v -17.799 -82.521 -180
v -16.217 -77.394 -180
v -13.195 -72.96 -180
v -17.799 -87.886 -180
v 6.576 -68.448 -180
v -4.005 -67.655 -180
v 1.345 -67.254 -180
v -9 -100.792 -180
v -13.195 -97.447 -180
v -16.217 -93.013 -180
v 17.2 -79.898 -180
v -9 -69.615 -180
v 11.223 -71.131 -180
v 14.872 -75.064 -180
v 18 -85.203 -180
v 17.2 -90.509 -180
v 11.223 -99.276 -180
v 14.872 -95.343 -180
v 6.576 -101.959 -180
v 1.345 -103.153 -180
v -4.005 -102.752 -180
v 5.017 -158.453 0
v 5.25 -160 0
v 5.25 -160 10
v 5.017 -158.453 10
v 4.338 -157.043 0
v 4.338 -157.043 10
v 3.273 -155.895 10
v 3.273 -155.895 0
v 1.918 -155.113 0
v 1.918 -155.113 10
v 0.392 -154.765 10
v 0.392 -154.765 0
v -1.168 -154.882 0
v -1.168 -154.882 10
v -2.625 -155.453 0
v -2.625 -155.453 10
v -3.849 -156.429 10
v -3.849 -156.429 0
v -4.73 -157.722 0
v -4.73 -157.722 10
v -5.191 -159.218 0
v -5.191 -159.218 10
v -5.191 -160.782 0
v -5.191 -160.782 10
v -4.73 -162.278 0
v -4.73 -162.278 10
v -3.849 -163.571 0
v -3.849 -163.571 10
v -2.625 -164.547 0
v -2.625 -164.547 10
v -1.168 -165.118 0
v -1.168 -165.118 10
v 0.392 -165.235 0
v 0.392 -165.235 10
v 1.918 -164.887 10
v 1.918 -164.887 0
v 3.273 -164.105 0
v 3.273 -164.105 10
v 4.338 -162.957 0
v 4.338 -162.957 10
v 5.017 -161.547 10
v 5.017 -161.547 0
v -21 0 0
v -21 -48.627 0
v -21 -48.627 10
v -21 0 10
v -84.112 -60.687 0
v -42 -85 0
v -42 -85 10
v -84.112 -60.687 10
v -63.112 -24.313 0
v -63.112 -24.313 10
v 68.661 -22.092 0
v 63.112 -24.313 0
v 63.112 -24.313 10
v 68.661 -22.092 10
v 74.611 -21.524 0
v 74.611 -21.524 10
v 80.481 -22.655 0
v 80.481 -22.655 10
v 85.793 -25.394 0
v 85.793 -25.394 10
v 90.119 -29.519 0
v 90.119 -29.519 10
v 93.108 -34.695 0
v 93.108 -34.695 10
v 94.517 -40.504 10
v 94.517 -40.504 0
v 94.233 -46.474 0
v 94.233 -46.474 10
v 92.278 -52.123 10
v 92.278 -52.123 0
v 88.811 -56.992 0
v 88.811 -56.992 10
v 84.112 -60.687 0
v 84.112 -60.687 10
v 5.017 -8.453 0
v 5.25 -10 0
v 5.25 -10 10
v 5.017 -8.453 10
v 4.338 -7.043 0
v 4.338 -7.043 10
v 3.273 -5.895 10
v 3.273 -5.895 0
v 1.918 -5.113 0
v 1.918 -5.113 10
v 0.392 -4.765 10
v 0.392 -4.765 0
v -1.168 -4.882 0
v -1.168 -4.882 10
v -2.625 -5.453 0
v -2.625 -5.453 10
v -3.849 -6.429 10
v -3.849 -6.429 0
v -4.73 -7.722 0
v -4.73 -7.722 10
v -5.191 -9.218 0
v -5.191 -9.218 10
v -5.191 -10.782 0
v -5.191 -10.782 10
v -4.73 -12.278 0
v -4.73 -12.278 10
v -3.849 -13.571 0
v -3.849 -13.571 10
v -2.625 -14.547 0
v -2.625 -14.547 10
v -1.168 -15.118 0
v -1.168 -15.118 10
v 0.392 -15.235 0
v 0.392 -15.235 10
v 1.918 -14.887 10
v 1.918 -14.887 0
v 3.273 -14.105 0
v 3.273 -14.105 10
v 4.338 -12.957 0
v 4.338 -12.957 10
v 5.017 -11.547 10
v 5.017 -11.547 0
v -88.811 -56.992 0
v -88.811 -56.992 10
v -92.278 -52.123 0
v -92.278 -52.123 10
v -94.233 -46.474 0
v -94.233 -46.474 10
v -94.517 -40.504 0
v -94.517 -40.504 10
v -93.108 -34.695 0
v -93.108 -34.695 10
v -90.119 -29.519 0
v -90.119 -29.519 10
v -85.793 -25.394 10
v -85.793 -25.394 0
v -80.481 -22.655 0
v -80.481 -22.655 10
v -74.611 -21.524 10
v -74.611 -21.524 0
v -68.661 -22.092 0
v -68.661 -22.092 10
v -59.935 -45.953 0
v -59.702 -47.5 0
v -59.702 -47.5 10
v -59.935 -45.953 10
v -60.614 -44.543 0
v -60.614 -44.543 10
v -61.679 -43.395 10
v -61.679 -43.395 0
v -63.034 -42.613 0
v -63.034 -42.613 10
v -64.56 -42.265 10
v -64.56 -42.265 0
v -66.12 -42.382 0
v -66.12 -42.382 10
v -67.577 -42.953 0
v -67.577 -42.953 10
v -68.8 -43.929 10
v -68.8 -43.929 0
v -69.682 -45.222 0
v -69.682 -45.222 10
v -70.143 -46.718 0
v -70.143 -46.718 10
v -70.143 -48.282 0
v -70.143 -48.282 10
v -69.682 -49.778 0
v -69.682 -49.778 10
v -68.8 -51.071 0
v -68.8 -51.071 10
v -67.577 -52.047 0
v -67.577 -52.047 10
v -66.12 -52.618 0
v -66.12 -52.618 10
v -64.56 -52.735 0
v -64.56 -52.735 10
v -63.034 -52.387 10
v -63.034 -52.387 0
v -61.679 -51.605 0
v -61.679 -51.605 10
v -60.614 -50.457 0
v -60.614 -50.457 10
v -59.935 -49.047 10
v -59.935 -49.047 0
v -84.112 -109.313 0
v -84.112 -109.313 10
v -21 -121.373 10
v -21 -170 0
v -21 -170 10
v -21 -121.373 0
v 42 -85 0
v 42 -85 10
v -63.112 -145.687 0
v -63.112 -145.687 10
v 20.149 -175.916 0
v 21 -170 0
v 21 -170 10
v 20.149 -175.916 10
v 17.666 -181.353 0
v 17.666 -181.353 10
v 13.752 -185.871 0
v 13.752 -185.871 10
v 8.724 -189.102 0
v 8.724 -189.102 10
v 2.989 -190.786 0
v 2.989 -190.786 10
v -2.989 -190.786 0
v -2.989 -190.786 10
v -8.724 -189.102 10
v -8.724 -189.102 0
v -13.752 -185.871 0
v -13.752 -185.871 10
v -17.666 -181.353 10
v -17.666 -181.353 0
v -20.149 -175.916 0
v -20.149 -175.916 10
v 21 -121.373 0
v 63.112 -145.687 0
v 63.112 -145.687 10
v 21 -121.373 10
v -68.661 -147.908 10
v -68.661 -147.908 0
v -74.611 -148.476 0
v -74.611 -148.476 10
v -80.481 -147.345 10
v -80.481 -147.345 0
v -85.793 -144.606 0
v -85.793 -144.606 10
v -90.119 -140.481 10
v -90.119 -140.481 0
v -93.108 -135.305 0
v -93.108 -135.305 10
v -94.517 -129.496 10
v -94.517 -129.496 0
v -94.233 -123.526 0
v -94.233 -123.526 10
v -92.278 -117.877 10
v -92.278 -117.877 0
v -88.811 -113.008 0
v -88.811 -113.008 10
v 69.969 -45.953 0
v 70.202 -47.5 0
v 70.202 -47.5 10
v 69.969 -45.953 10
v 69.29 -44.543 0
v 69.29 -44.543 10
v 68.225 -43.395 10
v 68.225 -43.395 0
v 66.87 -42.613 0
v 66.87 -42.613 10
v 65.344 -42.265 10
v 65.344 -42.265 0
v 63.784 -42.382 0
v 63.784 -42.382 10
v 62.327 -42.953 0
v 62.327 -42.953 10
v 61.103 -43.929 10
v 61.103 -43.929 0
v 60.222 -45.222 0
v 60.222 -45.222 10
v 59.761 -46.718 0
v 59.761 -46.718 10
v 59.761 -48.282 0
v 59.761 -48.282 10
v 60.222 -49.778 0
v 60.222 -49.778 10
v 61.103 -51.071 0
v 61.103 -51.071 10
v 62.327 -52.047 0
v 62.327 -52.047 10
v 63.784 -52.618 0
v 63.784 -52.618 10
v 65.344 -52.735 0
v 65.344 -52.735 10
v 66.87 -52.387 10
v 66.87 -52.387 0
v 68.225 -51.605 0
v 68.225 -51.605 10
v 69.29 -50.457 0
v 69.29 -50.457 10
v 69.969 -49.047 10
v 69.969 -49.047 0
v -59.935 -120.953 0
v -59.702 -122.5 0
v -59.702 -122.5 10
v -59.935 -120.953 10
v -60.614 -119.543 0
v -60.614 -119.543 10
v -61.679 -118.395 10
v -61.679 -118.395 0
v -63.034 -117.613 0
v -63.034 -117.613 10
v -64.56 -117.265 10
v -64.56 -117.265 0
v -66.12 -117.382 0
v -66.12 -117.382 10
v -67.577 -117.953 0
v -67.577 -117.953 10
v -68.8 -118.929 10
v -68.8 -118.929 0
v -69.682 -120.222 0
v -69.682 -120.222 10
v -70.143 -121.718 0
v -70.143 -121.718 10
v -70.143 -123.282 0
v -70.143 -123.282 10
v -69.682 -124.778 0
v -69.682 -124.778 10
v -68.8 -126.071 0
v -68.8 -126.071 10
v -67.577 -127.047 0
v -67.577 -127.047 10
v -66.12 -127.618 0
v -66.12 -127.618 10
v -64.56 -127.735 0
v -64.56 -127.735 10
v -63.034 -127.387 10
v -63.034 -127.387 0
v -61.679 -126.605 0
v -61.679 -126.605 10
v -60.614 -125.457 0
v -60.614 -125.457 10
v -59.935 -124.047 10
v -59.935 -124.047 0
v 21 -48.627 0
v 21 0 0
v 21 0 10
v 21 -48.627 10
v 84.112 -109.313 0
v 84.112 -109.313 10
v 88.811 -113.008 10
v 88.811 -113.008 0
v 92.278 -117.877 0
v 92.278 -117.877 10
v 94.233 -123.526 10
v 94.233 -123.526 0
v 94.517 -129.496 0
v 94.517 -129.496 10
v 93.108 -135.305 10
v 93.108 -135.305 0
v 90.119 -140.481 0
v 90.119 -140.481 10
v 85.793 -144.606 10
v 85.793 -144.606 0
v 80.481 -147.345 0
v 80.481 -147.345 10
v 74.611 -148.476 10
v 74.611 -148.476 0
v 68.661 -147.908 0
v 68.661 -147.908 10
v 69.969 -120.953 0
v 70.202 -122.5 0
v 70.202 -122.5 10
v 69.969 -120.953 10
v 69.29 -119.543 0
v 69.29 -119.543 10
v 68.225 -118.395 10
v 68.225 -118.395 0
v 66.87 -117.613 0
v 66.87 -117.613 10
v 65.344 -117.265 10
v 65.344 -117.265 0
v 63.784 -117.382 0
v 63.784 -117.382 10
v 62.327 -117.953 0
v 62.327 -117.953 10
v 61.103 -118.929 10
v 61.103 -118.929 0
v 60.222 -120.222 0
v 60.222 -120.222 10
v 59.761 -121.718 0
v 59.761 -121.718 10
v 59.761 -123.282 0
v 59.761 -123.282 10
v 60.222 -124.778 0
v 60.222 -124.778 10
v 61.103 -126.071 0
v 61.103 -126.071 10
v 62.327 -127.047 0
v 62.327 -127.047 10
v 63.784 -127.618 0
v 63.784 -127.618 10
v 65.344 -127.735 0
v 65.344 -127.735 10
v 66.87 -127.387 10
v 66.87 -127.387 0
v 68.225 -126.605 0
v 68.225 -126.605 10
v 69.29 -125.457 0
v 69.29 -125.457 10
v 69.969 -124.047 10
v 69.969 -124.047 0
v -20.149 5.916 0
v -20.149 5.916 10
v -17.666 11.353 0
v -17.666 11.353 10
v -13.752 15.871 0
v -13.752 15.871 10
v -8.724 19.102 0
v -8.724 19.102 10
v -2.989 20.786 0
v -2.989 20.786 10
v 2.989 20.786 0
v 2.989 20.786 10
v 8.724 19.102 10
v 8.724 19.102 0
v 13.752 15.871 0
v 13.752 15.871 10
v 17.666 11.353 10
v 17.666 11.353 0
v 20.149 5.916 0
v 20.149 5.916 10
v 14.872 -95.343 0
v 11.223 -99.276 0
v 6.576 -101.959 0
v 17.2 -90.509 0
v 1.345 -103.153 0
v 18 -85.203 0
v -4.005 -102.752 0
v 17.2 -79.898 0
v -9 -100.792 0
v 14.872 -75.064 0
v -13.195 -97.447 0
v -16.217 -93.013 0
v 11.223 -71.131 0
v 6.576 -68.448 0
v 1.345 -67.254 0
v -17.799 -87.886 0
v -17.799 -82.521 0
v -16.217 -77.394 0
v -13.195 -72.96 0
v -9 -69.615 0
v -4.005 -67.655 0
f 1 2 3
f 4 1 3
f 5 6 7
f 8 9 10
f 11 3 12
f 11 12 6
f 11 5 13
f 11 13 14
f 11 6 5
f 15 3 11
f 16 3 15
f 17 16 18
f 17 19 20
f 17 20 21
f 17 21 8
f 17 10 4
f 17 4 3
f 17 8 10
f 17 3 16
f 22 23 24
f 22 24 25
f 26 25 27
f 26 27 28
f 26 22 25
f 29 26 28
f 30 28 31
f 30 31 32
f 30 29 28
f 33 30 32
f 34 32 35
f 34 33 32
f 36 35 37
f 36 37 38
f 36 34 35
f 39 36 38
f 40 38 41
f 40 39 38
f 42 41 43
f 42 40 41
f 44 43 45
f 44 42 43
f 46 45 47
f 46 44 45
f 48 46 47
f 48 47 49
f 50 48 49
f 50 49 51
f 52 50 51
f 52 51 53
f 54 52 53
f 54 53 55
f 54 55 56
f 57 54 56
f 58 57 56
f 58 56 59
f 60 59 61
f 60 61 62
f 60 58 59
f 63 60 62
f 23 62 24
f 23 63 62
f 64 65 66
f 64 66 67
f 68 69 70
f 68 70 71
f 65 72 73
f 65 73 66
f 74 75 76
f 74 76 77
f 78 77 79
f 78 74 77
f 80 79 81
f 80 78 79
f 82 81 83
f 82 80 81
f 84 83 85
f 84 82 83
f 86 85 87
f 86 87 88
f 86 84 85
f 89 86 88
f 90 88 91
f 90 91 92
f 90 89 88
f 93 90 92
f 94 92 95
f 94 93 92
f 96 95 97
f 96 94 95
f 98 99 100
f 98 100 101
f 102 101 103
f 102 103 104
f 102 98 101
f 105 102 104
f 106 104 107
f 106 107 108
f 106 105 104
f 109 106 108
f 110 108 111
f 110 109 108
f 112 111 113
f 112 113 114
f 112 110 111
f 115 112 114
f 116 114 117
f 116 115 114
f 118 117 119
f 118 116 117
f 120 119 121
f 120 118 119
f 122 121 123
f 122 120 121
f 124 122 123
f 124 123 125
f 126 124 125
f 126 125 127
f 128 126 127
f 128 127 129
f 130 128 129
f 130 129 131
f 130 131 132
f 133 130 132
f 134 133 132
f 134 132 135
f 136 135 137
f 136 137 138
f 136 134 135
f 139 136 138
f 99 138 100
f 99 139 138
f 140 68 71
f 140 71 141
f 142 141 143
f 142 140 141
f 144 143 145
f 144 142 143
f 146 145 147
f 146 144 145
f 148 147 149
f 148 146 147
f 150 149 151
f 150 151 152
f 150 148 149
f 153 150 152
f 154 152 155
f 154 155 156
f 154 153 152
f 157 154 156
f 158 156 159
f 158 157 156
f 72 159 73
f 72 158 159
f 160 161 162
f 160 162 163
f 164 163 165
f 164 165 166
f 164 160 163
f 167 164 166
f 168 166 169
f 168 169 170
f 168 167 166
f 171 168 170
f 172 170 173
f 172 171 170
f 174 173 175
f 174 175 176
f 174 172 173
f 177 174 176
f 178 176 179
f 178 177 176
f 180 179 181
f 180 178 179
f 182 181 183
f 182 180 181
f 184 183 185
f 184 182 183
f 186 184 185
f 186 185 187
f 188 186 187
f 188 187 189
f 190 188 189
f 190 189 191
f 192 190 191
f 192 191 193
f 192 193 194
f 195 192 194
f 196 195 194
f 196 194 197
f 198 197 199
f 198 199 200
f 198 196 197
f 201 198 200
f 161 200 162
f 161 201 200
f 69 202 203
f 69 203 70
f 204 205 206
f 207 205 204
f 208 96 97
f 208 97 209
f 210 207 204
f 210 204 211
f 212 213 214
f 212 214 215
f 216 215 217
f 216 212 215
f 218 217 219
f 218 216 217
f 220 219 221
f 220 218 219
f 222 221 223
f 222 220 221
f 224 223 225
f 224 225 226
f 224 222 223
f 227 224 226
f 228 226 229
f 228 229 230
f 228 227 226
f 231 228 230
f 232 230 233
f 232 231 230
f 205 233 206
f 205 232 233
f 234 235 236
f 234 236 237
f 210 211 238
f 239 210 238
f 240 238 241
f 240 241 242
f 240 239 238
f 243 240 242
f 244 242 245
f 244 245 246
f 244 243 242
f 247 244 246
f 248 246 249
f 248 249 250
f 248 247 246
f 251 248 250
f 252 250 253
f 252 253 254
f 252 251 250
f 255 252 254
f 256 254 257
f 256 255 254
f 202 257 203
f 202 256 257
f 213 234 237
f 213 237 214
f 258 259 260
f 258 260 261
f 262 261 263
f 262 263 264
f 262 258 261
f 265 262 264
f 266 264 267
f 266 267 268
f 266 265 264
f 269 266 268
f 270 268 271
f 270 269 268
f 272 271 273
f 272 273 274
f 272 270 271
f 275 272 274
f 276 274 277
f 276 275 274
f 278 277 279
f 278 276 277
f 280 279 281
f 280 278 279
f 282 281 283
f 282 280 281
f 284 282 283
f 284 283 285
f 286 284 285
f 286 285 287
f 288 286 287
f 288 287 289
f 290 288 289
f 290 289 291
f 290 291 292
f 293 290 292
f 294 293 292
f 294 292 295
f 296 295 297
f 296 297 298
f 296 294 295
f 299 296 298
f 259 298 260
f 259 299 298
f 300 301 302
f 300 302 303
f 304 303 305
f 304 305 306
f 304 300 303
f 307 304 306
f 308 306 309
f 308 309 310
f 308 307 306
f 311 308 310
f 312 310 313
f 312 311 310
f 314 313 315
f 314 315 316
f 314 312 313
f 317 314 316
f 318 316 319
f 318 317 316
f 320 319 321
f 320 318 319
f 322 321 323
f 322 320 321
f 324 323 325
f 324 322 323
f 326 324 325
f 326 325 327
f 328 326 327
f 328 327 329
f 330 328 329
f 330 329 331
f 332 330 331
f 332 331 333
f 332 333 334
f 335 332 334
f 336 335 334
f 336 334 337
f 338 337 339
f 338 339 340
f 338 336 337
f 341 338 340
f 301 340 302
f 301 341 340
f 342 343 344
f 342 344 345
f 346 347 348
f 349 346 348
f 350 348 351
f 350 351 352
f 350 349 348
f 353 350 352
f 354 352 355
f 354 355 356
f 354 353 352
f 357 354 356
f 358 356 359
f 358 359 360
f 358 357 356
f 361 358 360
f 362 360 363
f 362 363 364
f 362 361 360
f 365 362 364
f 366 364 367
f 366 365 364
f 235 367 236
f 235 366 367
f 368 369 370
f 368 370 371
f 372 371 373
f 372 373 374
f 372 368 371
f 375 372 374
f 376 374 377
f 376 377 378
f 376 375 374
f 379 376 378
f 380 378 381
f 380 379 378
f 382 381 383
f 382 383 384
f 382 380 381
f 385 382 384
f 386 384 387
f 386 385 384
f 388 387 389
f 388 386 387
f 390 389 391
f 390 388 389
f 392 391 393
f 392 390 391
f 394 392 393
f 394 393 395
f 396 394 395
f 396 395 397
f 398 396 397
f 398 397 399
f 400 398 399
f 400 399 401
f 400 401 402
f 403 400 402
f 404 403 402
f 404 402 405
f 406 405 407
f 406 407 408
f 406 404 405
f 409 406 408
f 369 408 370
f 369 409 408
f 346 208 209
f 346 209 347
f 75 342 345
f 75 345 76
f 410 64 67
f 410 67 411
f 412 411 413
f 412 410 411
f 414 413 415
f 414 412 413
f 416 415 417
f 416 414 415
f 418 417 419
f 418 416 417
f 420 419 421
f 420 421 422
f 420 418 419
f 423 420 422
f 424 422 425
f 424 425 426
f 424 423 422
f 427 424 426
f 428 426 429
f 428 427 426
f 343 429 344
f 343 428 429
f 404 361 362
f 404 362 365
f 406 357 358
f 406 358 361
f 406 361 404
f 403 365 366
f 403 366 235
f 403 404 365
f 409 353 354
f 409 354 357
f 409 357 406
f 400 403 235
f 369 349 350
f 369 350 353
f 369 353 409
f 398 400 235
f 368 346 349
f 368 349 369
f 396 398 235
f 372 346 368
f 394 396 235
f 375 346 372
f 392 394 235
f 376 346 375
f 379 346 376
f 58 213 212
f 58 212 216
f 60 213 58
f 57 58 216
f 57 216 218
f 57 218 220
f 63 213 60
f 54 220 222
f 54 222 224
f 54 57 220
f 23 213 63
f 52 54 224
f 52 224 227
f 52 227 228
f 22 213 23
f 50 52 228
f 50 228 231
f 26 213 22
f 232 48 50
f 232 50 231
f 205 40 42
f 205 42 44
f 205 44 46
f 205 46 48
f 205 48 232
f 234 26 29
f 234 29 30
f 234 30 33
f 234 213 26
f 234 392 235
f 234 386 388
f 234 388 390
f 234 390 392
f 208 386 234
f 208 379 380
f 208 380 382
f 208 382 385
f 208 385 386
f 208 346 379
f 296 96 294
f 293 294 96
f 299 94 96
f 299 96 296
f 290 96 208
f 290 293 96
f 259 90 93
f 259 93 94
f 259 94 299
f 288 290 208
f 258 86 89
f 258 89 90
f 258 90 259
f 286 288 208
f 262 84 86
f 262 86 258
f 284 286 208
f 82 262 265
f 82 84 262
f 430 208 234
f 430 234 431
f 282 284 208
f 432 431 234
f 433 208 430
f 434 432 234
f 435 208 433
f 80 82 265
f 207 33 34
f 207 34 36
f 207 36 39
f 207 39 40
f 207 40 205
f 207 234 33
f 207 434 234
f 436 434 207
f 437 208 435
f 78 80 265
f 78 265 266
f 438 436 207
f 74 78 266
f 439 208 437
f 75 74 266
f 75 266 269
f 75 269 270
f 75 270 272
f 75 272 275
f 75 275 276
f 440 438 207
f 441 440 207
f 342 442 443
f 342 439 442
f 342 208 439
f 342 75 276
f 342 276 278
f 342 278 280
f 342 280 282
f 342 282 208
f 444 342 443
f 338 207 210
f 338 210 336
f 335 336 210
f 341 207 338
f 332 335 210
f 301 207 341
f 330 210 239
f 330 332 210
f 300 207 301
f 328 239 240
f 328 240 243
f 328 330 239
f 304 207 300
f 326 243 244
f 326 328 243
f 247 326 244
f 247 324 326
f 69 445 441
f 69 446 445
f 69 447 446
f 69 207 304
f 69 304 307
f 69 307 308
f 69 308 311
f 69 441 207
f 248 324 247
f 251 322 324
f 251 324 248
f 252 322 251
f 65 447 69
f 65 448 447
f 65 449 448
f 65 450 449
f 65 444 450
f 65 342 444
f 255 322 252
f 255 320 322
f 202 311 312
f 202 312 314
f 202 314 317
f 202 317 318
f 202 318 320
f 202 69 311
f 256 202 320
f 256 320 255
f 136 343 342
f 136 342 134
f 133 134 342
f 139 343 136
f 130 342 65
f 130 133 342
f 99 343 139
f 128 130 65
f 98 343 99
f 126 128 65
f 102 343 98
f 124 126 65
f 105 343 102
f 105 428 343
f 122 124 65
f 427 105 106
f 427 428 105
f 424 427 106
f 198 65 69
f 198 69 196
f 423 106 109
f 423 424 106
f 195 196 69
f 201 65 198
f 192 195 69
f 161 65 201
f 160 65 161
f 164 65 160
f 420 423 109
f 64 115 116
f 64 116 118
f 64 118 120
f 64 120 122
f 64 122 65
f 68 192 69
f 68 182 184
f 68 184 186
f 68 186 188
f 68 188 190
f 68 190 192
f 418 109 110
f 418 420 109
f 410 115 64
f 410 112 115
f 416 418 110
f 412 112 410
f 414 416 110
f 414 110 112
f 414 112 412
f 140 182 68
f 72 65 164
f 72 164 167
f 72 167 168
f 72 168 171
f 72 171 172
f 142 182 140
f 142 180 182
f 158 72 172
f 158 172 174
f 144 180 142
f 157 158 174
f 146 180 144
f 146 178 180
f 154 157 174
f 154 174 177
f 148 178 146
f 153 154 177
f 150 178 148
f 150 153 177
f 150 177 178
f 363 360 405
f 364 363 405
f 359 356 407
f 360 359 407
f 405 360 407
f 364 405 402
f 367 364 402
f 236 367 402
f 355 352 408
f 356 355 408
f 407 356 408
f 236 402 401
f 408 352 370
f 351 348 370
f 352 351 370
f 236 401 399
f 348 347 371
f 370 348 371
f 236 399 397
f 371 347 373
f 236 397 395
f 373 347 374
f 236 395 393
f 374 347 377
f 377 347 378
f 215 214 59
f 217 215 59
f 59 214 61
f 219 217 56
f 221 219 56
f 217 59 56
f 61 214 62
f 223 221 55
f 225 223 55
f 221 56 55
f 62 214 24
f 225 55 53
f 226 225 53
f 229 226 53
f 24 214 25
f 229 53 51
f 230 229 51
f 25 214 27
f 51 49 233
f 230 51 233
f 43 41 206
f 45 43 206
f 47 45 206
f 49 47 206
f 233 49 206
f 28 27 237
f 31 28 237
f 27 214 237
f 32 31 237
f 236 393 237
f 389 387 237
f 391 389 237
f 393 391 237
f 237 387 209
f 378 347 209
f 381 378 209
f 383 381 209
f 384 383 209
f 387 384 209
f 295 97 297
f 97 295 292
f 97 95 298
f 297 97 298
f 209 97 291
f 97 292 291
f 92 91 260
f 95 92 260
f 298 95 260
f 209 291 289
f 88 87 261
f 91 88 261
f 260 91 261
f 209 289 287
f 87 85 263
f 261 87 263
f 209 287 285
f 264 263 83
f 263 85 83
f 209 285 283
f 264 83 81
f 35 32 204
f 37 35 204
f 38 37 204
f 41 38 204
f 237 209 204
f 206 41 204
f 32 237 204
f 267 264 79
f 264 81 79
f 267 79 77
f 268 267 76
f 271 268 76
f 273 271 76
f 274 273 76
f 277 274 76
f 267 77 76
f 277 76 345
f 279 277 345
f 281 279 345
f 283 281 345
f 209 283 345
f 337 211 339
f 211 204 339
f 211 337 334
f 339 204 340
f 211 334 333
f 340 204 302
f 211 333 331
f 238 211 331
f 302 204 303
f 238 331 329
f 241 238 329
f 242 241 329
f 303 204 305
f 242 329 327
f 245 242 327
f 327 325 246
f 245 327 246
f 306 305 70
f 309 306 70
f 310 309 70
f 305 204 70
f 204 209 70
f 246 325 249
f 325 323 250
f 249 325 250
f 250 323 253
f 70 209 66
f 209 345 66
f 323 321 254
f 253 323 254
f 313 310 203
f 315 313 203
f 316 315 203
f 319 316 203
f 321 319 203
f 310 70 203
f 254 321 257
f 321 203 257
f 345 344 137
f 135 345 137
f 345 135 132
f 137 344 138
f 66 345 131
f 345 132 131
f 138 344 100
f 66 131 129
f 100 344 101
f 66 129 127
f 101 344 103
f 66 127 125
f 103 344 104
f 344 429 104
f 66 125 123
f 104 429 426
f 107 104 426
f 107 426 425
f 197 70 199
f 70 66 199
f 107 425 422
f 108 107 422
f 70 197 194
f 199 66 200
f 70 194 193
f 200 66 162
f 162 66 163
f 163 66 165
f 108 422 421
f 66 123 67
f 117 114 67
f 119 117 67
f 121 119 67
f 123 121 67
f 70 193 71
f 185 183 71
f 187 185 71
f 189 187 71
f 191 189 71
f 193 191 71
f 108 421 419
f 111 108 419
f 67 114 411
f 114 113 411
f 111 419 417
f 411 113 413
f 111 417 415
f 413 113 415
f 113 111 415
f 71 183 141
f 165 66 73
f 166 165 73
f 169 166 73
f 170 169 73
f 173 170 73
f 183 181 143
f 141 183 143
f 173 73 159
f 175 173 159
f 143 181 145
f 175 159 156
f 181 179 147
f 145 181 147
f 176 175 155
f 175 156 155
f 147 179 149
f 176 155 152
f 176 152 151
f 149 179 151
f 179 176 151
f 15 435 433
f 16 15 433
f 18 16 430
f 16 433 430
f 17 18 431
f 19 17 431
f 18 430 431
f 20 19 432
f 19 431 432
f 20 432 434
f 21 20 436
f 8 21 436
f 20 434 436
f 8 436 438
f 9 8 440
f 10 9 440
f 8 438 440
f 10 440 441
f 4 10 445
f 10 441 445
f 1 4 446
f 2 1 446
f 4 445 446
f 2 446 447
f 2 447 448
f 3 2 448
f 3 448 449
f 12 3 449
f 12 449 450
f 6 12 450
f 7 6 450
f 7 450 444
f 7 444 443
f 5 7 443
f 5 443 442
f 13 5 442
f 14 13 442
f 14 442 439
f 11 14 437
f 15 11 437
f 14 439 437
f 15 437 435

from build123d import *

# Parameters (mm, degrees)
SKETCH_1_R      = 5.25
EXTRUDE_1_DEPTH = 10
SKETCH_2_R      = 18
EXTRUDE_2_DEPTH = 180


with BuildPart() as part:
    # 草图1 → 凸台-拉伸1 (new body)
    with BuildSketch(Plane.XY):
        with BuildLine():
            Line((21, 0), (21, -48.626933041))
            Line((21, -48.626933041), (63.112159322, -24.313466521))
            ThreePointArc((63.112159322, -24.313466521), (91.798692801, -32), (84.112159322, -60.686533479))
            Line((84.112159322, -60.686533479), (42, -85))
            Line((42, -85), (84.112159322, -109.313466521))
            ThreePointArc((84.112159322, -109.313466521), (91.798692801, -138), (63.112159322, -145.686533479))
            Line((63.112159322, -145.686533479), (21, -121.373066959))
            Line((21, -121.373066959), (21, -170))
            ThreePointArc((21, -170), (0, -191), (-21, -170))
            Line((-21, -170), (-21, -121.373066959))
            Line((-21, -121.373066959), (-63.112159322, -145.686533479))
            ThreePointArc((-63.112159322, -145.686533479), (-91.798692801, -138), (-84.112159322, -109.313466521))
            Line((-84.112159322, -109.313466521), (-42, -85))
            Line((-42, -85), (-84.112159322, -60.686533479))
            ThreePointArc((-84.112159322, -60.686533479), (-91.798692801, -32), (-63.112159322, -24.313466521))
            Line((-63.112159322, -24.313466521), (-21, -48.626933041))
            Line((-21, -48.626933041), (-21, 0))
            ThreePointArc((-21, 0), (0, 21), (21, 0))
        make_face()
        with Locations((0, -10)):
            Circle(SKETCH_1_R, mode=Mode.SUBTRACT)
        with Locations((64.951905284, -47.5)):
            Circle(SKETCH_1_R, mode=Mode.SUBTRACT)
        with Locations((64.951905284, -122.5)):
            Circle(SKETCH_1_R, mode=Mode.SUBTRACT)
        with Locations((0, -160)):
            Circle(SKETCH_1_R, mode=Mode.SUBTRACT)
        with Locations((-64.951905284, -122.5)):
            Circle(SKETCH_1_R, mode=Mode.SUBTRACT)
        with Locations((-64.951905284, -47.5)):
            Circle(SKETCH_1_R, mode=Mode.SUBTRACT)
    extrude(amount=EXTRUDE_1_DEPTH)

    # 草图2 → 凸台-拉伸2 (add)
    with BuildSketch(Plane(origin=(0, 0, 0), x_dir=(-1, 0, 0), z_dir=(0, 0, -1))):
        with Locations(Location((0, -85.20347481, 0), (0, 0, 180))):
            Circle(SKETCH_2_R)
    extrude(amount=EXTRUDE_2_DEPTH)


solid = part.part
